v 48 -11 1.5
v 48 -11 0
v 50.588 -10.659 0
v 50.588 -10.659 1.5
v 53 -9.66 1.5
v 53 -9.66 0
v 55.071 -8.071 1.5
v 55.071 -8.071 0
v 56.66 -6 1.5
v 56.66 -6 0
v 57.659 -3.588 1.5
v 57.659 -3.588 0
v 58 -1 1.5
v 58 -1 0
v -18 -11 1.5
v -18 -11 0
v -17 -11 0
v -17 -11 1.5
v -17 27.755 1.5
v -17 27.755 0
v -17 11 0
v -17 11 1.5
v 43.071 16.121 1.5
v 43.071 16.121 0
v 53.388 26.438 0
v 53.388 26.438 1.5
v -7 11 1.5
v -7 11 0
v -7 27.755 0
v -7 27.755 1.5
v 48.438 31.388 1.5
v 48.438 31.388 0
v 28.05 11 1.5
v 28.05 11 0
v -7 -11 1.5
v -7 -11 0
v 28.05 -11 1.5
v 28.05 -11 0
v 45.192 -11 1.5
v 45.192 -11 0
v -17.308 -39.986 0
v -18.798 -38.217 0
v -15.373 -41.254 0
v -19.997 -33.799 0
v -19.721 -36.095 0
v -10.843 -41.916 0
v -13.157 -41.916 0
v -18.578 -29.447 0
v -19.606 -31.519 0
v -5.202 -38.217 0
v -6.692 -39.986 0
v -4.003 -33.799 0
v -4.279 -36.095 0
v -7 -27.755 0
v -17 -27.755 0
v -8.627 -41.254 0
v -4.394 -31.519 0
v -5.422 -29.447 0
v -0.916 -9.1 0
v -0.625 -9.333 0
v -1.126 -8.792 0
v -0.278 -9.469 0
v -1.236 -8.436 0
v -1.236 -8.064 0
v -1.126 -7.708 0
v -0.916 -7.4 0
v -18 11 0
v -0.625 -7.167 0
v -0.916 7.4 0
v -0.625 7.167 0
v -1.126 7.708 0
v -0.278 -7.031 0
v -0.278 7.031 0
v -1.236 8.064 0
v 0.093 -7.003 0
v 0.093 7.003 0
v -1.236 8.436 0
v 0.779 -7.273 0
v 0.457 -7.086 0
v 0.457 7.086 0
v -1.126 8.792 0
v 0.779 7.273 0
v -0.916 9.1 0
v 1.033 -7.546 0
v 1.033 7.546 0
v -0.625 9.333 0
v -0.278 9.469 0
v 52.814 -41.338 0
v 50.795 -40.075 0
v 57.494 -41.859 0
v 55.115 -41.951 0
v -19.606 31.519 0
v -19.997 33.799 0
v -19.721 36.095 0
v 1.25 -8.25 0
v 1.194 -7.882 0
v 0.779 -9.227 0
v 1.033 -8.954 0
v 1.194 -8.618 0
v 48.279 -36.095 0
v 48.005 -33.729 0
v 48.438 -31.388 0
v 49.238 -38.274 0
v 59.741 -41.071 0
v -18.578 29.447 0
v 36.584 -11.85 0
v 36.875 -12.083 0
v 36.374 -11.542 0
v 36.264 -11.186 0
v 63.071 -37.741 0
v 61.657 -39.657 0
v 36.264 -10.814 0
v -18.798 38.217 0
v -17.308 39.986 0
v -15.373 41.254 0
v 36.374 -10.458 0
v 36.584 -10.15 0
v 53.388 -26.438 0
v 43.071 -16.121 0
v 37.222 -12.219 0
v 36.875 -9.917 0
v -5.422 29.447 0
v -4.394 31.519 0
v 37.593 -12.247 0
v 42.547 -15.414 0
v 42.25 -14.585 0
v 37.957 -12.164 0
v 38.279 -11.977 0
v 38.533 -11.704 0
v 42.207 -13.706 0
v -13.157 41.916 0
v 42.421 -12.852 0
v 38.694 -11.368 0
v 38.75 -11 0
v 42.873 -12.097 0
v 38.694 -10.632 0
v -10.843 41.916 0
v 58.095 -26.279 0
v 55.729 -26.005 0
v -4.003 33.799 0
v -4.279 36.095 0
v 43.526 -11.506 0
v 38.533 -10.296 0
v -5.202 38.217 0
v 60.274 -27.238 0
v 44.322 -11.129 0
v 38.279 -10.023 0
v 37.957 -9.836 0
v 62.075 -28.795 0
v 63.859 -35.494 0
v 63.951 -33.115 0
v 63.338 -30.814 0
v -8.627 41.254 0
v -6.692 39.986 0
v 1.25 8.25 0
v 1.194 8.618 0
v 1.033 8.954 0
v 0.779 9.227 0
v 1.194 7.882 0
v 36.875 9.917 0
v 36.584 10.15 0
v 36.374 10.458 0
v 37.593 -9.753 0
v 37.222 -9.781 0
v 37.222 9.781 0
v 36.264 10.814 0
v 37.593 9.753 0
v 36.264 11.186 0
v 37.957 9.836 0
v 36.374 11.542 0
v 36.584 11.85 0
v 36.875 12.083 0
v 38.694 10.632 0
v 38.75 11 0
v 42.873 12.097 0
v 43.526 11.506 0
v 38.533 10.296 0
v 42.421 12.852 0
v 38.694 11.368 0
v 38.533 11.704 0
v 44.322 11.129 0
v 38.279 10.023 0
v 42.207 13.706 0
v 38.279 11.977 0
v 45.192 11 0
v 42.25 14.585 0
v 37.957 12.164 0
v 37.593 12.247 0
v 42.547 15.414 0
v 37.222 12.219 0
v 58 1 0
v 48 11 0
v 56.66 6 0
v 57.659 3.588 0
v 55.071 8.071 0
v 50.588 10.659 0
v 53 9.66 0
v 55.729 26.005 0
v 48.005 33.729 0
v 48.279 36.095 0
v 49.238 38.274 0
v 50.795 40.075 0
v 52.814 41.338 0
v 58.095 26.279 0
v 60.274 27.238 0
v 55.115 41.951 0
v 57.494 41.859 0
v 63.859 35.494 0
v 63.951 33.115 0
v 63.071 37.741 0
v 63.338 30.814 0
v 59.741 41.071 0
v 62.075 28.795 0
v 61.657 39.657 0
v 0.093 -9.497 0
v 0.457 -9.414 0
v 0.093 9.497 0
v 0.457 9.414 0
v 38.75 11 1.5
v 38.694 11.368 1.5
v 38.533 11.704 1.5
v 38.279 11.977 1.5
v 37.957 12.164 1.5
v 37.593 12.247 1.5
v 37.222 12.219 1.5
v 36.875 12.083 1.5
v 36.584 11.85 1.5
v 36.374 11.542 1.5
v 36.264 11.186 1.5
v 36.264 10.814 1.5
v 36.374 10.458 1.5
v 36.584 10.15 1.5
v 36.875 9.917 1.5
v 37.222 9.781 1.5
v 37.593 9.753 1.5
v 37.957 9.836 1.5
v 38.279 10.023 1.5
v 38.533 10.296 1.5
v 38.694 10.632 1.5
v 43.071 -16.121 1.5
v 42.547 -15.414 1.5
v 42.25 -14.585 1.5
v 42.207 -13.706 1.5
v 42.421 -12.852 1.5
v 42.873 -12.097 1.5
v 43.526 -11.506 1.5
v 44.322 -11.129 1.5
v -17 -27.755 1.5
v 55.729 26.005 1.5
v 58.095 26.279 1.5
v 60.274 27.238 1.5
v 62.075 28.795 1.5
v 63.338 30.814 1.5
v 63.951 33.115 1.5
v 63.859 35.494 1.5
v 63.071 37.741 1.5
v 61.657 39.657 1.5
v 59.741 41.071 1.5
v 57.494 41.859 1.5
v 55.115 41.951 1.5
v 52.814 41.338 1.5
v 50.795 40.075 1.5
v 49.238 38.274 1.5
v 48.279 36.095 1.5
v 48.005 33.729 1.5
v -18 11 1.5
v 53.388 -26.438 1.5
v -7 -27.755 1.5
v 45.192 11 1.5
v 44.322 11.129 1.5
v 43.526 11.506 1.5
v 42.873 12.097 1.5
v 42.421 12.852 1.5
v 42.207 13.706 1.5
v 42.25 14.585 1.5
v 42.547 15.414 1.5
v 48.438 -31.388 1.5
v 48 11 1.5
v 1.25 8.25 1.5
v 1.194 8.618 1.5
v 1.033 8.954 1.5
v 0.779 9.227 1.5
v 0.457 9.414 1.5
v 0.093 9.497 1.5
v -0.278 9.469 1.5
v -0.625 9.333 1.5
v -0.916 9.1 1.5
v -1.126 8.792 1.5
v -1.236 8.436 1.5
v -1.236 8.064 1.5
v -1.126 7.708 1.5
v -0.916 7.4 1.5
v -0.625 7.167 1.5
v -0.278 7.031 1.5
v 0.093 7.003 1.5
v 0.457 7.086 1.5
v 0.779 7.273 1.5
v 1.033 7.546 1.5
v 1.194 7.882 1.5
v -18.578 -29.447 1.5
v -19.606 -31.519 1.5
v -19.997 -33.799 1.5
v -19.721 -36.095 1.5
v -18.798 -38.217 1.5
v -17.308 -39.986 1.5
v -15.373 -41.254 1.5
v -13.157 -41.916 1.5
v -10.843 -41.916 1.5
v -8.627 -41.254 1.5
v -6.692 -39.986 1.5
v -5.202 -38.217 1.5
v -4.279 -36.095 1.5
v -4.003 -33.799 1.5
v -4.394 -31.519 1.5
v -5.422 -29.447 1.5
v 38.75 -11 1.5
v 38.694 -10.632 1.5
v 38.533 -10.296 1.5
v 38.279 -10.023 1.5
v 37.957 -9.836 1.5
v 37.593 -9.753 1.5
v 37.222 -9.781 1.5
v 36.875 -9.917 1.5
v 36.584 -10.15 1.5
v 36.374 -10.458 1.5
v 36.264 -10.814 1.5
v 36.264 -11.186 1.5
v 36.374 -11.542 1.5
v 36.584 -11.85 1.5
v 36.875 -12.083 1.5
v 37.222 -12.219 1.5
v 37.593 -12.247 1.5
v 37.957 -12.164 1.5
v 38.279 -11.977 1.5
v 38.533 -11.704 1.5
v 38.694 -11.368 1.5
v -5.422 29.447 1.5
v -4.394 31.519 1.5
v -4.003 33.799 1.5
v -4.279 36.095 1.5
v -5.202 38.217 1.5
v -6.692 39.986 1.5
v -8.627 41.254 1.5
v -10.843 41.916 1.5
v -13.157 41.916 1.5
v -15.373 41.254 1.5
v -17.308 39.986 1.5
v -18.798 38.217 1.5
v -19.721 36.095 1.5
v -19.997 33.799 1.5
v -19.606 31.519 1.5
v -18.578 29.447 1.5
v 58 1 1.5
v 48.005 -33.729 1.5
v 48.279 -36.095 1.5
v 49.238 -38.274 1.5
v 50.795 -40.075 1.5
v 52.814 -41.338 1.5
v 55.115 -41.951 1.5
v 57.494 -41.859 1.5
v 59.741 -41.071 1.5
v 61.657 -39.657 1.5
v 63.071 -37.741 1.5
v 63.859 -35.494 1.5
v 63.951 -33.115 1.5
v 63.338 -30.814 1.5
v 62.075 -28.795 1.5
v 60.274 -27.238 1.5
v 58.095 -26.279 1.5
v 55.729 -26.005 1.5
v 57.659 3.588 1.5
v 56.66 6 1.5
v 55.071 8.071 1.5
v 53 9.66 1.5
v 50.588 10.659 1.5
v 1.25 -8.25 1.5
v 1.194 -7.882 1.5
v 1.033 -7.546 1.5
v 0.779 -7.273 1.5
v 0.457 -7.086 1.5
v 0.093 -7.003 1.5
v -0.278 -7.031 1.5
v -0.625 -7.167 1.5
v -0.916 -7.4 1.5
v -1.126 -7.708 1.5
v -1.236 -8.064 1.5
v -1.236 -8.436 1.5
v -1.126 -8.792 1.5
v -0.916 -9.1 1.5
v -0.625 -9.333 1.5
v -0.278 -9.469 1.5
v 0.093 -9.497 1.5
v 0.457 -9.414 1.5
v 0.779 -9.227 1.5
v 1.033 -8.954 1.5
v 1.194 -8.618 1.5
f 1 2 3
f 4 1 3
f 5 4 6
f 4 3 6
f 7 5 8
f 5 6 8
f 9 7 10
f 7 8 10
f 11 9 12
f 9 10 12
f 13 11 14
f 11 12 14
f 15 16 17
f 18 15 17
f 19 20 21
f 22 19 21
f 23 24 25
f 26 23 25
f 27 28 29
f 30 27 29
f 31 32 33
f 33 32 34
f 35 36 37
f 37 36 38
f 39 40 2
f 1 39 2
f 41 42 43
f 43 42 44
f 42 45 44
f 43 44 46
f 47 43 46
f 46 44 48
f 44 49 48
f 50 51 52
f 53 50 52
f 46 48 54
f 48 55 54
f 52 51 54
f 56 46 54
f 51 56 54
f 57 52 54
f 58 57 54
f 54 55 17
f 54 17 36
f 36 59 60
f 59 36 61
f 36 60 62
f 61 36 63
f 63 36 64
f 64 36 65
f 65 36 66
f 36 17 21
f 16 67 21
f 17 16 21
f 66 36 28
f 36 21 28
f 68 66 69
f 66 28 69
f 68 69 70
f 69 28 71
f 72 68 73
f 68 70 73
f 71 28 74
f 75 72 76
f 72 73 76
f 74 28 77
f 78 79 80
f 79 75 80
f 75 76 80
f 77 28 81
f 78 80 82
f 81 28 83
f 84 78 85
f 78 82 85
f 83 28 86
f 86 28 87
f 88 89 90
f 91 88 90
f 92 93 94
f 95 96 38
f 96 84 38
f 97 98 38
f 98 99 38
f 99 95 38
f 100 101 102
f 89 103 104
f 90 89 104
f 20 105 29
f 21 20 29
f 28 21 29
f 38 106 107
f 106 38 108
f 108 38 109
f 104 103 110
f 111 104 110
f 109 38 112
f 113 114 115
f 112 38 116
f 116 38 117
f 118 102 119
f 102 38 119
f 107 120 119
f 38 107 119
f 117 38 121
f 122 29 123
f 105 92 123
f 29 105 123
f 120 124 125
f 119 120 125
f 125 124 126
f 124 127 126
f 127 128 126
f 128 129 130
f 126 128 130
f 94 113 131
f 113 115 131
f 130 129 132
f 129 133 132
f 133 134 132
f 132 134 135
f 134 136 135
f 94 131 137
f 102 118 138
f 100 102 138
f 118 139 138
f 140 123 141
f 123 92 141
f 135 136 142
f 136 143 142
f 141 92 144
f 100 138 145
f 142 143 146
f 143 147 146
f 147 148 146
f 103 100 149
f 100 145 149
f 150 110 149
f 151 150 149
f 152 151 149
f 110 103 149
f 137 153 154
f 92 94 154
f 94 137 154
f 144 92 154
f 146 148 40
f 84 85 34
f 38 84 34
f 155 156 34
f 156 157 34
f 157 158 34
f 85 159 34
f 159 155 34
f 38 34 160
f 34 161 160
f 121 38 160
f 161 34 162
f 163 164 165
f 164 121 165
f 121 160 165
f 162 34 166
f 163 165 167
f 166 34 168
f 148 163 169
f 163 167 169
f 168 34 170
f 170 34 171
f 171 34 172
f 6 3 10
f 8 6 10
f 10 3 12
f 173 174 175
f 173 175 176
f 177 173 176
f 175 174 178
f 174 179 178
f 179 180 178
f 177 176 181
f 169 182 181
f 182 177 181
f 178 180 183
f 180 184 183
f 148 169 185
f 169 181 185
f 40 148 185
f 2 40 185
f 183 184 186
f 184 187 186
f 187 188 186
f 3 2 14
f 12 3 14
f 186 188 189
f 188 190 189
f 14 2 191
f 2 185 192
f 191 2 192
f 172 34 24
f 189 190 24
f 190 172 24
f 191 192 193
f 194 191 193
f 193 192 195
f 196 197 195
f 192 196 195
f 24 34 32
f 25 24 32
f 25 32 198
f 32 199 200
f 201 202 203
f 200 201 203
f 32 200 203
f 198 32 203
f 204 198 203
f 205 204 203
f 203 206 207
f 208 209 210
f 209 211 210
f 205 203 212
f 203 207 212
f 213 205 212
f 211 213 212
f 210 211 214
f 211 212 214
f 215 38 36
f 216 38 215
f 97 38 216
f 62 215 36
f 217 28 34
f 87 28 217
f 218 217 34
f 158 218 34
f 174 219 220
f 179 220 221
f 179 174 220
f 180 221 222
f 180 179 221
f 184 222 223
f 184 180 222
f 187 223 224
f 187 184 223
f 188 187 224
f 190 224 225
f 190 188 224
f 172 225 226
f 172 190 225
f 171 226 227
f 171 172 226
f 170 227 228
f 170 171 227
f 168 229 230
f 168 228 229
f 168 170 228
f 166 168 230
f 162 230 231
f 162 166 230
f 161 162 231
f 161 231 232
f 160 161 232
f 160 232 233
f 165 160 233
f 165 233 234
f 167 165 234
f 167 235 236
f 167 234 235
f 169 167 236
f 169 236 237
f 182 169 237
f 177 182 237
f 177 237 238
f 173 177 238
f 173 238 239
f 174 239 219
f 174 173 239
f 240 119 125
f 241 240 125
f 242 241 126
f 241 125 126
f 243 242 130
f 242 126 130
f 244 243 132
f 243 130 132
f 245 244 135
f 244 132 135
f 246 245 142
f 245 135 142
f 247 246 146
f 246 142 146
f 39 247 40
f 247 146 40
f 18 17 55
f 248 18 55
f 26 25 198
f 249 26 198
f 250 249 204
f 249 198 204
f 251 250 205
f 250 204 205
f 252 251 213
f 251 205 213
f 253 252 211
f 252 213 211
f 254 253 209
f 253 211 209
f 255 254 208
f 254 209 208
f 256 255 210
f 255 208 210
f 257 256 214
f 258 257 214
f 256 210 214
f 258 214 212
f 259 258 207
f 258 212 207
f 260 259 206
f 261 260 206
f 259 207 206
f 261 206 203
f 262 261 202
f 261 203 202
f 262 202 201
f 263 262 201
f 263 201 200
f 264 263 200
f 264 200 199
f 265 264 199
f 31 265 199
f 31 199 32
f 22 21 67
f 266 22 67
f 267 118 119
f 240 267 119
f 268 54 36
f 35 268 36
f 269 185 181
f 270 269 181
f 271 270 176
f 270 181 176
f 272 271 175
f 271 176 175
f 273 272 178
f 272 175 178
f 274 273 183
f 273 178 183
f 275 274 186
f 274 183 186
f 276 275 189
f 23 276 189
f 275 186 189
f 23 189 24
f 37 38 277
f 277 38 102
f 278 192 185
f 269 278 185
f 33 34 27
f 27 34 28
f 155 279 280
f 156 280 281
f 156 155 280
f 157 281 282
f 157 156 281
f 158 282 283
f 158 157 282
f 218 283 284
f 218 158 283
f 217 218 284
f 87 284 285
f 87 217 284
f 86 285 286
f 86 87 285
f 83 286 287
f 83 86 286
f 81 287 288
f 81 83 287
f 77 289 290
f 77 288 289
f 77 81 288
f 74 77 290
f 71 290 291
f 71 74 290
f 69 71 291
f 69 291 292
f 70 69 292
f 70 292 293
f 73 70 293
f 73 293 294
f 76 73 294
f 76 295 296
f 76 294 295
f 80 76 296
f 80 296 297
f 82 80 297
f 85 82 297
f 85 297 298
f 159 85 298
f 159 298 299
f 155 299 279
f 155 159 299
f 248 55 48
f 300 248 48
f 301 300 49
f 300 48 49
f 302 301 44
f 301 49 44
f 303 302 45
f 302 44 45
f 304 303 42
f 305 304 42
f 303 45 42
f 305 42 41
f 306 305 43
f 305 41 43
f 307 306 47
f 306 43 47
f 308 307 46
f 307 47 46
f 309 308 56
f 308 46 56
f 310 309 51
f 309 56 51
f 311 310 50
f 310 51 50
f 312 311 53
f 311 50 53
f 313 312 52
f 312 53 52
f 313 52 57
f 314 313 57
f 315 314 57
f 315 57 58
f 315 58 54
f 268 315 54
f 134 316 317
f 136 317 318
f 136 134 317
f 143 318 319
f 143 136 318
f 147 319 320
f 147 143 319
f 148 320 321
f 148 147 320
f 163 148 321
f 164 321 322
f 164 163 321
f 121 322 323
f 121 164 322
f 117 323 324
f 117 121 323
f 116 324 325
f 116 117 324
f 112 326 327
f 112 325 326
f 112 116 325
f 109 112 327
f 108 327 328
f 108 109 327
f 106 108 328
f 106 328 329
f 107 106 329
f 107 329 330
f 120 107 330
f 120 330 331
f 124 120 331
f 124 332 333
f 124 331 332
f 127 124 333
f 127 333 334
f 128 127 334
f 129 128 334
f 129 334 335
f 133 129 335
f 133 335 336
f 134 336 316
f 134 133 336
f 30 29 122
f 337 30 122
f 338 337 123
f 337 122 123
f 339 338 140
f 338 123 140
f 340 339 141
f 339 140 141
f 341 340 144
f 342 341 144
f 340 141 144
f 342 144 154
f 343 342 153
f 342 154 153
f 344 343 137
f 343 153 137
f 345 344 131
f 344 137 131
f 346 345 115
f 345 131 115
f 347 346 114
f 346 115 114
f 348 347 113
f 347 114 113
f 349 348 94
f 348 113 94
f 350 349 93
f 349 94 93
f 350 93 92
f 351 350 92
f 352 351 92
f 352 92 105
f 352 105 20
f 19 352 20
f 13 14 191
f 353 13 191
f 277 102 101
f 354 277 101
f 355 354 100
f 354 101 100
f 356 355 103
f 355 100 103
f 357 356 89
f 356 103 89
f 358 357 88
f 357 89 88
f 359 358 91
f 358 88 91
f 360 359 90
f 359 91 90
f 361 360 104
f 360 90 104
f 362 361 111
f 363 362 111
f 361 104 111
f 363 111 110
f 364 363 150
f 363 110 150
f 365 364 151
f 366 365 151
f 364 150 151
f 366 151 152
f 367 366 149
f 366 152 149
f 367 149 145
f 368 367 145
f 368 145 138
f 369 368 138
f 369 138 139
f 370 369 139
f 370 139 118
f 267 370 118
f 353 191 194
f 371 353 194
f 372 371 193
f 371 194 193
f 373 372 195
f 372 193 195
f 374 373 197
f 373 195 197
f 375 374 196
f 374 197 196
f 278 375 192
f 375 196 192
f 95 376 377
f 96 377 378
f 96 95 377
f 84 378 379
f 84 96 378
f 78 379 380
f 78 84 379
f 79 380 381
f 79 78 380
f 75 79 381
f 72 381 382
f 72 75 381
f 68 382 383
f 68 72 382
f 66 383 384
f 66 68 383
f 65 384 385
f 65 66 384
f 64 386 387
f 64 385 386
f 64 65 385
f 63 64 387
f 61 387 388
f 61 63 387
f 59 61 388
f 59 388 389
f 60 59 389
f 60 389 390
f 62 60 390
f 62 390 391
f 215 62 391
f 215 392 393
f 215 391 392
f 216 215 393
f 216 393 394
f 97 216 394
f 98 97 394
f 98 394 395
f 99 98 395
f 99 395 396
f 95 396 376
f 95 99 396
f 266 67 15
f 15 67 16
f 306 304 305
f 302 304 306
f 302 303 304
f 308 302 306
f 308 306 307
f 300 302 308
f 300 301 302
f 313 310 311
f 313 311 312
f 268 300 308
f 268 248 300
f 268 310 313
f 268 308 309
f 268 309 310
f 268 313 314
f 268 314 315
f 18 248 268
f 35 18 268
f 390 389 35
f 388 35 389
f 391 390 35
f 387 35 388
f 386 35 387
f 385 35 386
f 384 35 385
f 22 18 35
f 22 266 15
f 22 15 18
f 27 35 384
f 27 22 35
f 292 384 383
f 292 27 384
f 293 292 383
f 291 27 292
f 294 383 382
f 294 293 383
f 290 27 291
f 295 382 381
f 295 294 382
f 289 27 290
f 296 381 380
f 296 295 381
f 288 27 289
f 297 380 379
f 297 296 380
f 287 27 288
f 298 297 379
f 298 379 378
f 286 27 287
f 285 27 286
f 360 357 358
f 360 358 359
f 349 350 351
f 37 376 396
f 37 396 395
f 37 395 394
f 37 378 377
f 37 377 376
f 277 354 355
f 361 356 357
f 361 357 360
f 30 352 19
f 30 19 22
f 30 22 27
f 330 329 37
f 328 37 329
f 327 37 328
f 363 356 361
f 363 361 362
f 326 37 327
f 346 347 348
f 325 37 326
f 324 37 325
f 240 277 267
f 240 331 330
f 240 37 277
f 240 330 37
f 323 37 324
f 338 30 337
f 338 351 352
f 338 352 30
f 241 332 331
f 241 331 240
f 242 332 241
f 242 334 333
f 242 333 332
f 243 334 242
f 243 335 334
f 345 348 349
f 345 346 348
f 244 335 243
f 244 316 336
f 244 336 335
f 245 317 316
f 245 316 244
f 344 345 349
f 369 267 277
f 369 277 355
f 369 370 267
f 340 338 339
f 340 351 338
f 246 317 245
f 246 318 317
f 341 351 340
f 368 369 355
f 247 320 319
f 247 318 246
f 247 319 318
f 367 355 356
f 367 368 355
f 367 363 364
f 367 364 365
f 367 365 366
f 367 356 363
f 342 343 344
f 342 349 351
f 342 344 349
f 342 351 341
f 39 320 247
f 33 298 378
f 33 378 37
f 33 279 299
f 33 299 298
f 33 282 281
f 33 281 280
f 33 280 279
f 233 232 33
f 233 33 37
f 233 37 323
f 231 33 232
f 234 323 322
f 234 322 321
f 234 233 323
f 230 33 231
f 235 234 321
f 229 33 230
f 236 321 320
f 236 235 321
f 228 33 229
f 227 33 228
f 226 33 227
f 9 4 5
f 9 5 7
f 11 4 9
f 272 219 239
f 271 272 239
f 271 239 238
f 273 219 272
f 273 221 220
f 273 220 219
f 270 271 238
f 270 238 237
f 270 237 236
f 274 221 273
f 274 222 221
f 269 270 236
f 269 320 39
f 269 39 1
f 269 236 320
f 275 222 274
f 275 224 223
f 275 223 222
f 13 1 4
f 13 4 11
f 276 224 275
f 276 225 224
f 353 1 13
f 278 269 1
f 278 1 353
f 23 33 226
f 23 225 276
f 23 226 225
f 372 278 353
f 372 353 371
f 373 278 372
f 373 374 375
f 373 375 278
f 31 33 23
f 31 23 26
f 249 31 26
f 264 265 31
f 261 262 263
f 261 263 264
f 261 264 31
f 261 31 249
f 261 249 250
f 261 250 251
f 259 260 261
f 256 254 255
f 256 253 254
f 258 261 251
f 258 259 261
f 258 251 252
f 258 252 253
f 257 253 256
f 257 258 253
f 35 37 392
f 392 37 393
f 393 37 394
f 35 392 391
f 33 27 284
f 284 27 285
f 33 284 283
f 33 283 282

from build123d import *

# Parameters (mm, degrees)
F1_DEPTH = 1.5
F2_R     = 1.25
F3_DEPTH = 25


with BuildPart() as f1:
    # F0 (on Top) → F1 (new body)
    with BuildSketch(Plane.XY):
        with BuildLine():
            Line((-7, 11), (-7, 27.755002))
            ThreePointArc((-7, 27.755002), (-12, 42), (-17, 27.755002))
            Line((-17, 27.755002), (-17, 11))
            Line((-17, 11), (-18, 11))
            Line((-18, 11), (-18, -11))
            Line((-18, -11), (-17, -11))
            Line((-17, -11), (-17, -27.755002))
            ThreePointArc((-17, -27.755002), (-12, -42), (-7, -27.755002))
            Line((-7, -27.755002), (-7, -11))
            Line((-7, -11), (28.050253, -11))
            Line((28.050253, -11), (48.438379, -31.388126))
            ThreePointArc((48.438379, -31.388126), (61.656854, -39.656854), (53.388126, -26.438379))
            Line((53.388126, -26.438379), (43.071068, -16.12132))
            ThreePointArc((43.071068, -16.12132), (42.42075, -12.85195), (45.192388, -11))
            Line((45.192388, -11), (48, -11))
            ThreePointArc((48, -11), (55.071068, -8.071068), (58, -1))
            Line((58, -1), (58, 1))
            ThreePointArc((58, 1), (55.071068, 8.071068), (48, 11))
            Line((48, 11), (45.192388, 11))
            ThreePointArc((45.192388, 11), (42.42075, 12.85195), (43.071068, 16.12132))
            Line((43.071068, 16.12132), (53.388126, 26.438379))
            ThreePointArc((53.388126, 26.438379), (61.656854, 39.656854), (48.438379, 31.388126))
            Line((48.438379, 31.388126), (28.050253, 11))
            Line((28.050253, 11), (-7, 11))
        make_face()
    extrude(amount=F1_DEPTH)

    # F2 (on Top) → F3 (cut)
    with BuildSketch(Plane.XY):
        with Locations((0, -8.25)):
            Circle(F2_R)
        with Locations((0, 8.25)):
            Circle(F2_R)
        with Locations((37.5, -11)):
            Circle(F2_R)
        with Locations((37.5, 11)):
            Circle(F2_R)
    extrude(amount=F3_DEPTH, mode=Mode.SUBTRACT)


solid = f1.part
